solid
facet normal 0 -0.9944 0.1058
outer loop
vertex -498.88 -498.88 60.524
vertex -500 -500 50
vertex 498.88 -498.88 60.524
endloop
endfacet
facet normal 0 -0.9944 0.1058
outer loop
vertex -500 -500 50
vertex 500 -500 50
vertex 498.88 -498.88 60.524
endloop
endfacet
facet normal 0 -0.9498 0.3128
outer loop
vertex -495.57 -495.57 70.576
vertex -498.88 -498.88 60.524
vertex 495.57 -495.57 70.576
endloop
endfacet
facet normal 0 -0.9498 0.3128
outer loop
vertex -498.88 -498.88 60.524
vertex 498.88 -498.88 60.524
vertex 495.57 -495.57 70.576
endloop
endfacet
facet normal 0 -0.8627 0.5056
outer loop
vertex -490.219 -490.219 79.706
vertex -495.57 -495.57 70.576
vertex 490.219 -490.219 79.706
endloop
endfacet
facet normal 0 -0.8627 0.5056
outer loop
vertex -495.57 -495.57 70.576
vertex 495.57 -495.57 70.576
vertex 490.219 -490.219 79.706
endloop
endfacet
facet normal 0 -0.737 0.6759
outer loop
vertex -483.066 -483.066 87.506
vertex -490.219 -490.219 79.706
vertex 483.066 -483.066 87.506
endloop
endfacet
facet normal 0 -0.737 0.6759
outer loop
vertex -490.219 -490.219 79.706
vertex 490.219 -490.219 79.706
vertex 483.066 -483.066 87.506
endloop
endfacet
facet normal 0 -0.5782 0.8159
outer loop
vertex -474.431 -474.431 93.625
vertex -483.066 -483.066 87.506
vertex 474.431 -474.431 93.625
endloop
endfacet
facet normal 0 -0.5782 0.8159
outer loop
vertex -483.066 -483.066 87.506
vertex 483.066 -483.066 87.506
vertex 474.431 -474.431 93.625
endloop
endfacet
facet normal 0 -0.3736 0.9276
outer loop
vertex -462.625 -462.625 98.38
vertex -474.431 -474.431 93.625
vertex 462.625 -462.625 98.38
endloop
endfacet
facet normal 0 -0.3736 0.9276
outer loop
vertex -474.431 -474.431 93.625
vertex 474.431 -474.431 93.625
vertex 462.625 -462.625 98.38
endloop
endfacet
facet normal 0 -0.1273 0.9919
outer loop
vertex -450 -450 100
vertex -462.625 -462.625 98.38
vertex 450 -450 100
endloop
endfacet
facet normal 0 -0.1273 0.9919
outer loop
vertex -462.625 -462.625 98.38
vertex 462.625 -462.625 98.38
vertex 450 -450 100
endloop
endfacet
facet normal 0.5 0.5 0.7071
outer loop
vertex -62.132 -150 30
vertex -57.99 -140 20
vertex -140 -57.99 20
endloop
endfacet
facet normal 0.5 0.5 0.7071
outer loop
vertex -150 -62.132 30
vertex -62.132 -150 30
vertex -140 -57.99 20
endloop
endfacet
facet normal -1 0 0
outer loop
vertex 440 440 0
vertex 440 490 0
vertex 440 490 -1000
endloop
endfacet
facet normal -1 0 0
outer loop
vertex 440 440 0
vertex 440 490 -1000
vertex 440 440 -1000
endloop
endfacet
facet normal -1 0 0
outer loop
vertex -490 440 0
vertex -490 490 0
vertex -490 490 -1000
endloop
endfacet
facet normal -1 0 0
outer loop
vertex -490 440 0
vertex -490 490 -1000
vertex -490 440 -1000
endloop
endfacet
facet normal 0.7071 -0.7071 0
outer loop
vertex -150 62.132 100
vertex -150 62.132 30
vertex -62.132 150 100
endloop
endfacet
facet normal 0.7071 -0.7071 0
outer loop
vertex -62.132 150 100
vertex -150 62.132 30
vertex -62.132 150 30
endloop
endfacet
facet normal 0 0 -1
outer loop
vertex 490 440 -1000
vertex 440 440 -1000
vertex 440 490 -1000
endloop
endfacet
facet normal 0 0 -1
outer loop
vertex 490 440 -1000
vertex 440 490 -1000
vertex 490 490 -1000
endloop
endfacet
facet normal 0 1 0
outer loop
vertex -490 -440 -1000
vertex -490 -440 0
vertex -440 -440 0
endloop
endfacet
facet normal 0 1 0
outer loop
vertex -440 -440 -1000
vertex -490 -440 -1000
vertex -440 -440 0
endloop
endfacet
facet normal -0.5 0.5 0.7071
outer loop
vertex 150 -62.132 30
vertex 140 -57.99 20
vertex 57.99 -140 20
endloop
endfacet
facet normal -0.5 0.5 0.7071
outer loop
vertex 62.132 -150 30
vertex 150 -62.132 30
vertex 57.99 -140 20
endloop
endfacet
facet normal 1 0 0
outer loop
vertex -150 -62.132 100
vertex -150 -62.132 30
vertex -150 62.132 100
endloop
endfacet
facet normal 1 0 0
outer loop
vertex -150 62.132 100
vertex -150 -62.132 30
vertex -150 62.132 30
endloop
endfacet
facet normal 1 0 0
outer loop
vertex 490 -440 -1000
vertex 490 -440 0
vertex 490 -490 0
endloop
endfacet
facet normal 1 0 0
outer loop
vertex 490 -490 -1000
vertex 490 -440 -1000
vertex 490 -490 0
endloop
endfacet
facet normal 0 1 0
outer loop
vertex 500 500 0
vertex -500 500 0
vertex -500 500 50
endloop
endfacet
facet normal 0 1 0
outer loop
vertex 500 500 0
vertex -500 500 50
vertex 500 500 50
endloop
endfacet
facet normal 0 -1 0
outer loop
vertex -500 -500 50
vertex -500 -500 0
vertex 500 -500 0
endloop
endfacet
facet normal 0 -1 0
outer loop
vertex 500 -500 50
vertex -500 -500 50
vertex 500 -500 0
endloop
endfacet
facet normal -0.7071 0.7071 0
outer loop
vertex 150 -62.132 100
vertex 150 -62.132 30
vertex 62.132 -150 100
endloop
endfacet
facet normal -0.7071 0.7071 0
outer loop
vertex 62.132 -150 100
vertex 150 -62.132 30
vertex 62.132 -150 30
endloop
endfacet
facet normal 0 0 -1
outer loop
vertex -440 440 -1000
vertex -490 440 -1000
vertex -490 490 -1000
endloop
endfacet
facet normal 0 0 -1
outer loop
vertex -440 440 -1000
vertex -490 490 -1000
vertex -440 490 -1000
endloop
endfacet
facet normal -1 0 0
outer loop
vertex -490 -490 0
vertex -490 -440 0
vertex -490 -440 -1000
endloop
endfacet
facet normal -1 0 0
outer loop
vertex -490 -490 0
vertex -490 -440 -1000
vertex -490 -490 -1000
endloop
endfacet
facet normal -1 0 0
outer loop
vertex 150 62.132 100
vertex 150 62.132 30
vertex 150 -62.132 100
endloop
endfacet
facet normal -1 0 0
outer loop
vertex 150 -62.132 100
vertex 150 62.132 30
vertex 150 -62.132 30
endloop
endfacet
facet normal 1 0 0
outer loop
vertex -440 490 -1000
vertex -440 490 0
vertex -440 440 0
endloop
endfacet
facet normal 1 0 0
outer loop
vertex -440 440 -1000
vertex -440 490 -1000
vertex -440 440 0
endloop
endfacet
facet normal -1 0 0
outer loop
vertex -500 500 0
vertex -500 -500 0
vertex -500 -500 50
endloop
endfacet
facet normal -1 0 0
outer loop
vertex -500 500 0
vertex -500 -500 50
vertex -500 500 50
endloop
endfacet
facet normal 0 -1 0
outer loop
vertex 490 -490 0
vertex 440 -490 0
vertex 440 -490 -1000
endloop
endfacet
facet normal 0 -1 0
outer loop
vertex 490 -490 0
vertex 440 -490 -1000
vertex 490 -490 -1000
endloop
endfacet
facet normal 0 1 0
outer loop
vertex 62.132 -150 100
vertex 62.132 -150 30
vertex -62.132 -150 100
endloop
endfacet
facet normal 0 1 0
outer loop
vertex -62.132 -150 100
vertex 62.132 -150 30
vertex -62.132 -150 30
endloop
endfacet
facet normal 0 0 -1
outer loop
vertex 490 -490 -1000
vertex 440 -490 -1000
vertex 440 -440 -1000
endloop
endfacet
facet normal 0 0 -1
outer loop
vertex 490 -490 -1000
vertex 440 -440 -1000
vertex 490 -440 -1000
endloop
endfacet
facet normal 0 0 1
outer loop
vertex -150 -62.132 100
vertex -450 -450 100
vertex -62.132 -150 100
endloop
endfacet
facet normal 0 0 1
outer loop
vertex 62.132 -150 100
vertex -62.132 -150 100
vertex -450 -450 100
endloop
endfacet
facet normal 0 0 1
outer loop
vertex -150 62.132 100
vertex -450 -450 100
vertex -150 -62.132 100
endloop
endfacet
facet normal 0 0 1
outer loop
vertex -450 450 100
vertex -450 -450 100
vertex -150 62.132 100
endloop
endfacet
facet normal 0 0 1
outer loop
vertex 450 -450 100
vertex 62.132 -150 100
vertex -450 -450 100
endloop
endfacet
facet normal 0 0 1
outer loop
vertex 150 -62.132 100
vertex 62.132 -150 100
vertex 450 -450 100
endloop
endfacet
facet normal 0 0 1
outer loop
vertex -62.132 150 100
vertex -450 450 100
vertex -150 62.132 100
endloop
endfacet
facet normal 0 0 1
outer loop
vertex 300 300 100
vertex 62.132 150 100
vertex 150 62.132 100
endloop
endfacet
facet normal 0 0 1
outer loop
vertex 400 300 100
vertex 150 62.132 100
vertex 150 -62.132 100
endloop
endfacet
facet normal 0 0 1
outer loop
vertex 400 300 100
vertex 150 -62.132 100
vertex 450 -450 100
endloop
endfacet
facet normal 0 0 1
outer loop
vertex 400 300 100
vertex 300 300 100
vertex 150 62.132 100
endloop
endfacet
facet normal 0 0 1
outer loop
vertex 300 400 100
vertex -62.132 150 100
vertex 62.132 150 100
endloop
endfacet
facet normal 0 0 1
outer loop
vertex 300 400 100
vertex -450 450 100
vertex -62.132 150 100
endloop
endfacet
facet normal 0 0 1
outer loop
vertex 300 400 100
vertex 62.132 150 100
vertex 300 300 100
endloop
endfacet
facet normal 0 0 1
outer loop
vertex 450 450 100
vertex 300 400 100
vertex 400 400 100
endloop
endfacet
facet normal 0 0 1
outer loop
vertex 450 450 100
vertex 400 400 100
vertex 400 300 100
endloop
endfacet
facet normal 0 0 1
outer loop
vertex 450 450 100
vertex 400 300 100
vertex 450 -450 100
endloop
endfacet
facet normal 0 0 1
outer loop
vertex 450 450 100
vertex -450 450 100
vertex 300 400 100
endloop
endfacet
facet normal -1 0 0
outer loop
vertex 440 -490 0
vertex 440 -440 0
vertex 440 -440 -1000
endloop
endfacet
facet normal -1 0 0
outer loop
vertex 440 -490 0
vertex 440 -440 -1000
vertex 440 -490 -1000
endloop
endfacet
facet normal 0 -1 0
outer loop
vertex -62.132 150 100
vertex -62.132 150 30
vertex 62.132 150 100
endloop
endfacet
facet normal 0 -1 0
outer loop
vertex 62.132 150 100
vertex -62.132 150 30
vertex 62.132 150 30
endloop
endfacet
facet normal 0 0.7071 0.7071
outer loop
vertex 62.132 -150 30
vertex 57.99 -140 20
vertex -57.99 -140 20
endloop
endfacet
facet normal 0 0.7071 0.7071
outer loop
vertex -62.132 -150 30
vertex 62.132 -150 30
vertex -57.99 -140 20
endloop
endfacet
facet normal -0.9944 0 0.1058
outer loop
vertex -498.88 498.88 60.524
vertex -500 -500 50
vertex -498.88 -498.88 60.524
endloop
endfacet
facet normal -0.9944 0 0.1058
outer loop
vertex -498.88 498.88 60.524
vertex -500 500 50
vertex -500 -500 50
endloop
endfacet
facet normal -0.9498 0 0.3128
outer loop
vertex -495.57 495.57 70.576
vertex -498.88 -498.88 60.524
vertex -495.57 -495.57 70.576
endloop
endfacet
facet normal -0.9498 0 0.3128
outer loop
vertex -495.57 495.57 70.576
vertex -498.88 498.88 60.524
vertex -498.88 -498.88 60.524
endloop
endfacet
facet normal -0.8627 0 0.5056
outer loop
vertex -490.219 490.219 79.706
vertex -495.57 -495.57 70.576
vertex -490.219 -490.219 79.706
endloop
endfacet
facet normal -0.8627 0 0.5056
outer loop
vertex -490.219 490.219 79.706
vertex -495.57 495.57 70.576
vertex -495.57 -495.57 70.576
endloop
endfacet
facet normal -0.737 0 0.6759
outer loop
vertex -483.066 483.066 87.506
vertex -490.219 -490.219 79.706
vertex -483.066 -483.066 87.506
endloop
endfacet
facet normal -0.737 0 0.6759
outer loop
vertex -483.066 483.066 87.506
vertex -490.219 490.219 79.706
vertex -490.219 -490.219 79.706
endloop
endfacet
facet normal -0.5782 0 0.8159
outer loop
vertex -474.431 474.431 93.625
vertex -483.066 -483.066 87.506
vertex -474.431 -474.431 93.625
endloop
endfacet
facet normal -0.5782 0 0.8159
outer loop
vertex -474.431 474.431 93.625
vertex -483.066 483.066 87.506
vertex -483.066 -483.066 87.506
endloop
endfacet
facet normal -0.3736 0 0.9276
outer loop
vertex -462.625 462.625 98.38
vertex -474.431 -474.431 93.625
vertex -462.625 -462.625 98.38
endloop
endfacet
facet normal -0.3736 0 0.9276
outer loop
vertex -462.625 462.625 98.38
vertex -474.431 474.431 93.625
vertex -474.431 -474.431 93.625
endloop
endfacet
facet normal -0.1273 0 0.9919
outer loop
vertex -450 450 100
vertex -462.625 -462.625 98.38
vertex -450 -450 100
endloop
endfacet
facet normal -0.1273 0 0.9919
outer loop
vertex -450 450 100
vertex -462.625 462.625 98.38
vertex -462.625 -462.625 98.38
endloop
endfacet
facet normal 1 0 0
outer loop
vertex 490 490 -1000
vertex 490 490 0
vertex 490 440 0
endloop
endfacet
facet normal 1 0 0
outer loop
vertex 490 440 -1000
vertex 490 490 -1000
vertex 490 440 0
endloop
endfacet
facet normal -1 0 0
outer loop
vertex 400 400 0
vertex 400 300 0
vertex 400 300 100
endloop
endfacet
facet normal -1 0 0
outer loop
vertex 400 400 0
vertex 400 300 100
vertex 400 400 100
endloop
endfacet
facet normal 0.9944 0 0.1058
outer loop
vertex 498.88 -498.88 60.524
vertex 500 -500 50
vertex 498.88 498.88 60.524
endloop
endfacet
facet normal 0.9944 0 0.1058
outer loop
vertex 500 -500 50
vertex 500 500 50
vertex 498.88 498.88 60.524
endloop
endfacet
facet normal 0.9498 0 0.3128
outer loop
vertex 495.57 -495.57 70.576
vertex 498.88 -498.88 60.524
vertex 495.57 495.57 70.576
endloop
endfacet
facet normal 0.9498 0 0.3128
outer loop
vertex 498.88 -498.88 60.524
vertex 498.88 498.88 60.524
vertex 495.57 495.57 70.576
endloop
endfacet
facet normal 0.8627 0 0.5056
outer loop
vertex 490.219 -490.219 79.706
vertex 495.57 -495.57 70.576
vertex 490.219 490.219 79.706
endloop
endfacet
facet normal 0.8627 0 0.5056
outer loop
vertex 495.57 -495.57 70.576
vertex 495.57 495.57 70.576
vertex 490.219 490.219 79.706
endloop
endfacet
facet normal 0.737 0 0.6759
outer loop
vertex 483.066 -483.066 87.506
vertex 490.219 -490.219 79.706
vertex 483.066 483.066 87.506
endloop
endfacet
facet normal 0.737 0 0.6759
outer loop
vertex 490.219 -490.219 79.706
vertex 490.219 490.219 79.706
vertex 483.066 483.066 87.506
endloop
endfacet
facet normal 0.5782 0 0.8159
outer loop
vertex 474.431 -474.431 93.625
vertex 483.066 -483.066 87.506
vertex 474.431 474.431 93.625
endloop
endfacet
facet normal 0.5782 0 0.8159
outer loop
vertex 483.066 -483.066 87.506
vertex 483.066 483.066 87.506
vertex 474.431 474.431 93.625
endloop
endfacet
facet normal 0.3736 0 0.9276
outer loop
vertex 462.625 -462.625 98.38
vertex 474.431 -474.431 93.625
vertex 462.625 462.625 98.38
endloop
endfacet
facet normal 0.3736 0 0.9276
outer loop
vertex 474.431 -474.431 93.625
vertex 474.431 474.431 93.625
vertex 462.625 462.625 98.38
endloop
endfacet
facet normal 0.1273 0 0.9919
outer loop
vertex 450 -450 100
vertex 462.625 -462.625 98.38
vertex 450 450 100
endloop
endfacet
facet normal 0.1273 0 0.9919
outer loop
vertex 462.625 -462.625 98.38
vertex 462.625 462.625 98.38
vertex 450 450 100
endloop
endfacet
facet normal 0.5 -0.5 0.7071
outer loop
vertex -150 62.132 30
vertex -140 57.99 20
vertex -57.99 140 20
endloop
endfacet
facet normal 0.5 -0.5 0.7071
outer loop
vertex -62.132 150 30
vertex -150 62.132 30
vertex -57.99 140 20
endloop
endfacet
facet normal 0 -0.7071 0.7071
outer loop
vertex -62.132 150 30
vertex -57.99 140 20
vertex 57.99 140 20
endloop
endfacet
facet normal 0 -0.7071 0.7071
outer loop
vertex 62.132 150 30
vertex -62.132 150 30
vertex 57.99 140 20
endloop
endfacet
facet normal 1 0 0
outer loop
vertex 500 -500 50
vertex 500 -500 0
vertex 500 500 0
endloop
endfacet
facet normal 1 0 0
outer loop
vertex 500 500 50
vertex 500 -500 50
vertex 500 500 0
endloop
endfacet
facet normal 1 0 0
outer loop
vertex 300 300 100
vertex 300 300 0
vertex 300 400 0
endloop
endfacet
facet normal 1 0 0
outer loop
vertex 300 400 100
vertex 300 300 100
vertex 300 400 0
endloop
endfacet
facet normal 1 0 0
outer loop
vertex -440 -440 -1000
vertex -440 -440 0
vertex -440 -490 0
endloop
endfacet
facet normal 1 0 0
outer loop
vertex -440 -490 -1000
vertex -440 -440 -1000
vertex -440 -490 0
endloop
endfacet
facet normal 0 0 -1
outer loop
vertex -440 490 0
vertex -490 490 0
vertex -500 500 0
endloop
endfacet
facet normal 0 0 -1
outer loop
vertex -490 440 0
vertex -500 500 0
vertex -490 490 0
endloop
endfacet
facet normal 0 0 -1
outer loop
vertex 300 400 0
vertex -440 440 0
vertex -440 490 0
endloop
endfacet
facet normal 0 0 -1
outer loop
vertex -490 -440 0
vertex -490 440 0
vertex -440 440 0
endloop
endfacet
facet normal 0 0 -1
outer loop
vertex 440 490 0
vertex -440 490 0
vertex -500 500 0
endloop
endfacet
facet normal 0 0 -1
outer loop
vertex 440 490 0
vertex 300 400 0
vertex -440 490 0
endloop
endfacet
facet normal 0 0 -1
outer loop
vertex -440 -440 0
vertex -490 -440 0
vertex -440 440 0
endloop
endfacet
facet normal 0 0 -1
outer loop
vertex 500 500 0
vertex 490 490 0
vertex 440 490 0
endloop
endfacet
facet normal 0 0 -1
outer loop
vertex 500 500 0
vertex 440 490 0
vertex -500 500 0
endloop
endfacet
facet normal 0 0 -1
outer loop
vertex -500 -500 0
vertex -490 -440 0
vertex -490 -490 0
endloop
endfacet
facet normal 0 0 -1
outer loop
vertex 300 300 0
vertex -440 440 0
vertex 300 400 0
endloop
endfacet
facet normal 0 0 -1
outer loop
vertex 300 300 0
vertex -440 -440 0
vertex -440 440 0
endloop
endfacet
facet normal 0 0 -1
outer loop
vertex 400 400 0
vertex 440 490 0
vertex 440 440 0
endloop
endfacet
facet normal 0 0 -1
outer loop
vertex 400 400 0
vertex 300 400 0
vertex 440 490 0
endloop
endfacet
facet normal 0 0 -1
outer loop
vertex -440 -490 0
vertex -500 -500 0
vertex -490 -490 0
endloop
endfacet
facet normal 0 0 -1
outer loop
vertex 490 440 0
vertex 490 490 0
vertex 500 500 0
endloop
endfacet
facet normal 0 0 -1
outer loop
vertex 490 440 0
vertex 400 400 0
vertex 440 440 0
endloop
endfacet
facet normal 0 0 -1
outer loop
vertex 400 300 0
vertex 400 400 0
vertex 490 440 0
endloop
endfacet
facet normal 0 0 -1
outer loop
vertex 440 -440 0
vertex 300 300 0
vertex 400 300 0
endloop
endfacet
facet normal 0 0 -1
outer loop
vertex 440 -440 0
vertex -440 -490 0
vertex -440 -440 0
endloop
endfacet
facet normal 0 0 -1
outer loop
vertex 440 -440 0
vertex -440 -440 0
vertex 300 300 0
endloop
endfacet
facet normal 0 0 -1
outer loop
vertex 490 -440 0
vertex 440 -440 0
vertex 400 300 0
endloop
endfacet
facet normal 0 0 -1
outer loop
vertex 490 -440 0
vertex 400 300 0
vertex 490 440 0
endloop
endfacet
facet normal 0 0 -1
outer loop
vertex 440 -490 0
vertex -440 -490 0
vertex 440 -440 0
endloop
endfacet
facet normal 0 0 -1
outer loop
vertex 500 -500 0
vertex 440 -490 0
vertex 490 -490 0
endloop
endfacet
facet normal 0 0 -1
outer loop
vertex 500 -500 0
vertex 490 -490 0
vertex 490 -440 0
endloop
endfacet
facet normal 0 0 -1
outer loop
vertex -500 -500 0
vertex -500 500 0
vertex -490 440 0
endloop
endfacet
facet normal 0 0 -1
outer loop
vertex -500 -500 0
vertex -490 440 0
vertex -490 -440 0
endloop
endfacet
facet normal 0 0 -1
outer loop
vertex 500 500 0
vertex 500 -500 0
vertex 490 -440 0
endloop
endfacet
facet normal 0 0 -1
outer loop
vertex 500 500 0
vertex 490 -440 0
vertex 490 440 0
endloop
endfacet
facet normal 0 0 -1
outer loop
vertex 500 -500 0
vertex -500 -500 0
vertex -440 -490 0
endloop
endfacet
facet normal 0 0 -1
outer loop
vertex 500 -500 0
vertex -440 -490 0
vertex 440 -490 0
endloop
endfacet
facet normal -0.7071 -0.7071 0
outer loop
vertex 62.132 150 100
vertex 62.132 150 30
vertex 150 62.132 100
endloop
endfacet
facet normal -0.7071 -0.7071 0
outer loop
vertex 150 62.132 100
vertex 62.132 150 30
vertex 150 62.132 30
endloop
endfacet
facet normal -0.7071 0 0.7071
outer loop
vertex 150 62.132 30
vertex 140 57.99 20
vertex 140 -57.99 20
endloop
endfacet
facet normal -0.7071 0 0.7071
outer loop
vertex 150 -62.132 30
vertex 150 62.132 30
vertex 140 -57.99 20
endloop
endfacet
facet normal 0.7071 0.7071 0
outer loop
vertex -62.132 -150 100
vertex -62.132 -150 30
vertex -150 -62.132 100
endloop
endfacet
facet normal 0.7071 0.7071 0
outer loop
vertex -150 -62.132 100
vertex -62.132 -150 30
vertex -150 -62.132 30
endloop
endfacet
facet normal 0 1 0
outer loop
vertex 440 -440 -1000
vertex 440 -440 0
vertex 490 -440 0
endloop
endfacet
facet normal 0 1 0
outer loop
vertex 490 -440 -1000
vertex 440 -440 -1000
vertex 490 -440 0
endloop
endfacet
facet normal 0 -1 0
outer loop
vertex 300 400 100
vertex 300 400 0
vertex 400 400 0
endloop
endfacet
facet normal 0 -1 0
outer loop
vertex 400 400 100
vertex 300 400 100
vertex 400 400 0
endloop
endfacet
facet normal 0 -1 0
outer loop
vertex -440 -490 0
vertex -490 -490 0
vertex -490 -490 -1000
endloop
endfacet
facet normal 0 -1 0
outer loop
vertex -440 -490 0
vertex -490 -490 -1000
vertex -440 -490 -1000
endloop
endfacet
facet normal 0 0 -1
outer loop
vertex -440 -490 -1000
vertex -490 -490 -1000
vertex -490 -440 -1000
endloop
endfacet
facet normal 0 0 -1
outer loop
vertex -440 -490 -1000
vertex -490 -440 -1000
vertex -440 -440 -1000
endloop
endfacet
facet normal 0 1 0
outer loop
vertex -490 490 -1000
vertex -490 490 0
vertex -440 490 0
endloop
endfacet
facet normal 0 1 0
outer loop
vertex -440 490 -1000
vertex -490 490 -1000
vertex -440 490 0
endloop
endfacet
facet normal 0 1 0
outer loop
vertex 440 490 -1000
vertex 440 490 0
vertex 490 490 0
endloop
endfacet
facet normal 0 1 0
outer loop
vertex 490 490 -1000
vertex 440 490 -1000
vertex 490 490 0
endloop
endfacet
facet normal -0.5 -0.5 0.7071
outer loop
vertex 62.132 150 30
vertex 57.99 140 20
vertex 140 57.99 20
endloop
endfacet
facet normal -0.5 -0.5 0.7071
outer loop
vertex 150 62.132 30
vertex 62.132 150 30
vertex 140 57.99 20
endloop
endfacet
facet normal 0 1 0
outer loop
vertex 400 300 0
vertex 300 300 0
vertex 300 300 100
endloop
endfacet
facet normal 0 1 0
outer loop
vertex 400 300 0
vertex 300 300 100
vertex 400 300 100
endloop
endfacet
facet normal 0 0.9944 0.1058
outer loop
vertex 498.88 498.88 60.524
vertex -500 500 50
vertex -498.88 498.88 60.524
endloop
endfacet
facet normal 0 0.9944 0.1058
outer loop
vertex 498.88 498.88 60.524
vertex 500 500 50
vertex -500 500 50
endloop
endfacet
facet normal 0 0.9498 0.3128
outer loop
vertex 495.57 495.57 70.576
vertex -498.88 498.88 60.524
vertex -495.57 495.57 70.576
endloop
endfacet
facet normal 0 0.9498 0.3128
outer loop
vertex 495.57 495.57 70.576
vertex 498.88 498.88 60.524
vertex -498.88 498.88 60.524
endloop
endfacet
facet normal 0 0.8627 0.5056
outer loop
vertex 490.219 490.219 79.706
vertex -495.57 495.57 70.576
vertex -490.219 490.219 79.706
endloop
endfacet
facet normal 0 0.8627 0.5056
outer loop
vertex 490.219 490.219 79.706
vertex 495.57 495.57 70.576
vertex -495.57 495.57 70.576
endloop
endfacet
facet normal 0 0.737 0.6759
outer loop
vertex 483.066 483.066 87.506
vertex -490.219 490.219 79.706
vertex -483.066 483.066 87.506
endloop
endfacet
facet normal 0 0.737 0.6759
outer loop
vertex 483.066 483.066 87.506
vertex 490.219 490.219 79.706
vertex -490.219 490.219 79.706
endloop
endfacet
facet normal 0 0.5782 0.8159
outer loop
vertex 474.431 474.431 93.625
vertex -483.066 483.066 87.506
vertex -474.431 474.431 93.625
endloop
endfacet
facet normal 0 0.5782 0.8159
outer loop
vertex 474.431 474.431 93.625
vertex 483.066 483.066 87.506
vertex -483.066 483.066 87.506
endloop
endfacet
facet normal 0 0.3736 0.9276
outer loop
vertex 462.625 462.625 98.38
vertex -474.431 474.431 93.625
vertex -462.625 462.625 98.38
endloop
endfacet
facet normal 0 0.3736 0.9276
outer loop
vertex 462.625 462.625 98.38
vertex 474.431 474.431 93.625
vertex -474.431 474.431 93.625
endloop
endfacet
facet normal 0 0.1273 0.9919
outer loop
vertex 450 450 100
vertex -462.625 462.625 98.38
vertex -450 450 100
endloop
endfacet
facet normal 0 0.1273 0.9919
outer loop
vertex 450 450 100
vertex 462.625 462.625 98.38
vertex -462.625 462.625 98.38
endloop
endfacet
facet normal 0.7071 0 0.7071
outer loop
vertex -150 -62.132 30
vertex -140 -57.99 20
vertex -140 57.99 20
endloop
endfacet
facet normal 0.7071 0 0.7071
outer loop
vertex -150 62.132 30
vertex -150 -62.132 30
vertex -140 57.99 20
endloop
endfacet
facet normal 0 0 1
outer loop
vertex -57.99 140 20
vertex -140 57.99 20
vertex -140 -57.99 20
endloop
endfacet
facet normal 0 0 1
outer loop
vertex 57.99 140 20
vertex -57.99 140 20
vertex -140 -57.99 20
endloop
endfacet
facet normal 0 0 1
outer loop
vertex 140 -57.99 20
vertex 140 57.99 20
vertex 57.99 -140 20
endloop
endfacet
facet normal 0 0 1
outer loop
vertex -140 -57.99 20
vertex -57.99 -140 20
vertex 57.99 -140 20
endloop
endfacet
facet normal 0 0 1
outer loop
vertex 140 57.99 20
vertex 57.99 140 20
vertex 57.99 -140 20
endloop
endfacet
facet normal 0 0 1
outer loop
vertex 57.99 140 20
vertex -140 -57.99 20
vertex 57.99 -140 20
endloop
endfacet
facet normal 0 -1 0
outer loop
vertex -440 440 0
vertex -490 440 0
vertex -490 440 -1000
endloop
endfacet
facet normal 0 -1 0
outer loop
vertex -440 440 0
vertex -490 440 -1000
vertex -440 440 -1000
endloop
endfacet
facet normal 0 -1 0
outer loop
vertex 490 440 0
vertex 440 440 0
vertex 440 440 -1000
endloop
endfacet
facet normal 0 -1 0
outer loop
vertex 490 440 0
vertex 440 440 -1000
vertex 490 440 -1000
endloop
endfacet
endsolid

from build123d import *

# Parameters (mm, degrees)
F0_W     = 1000
F0_H     = 1000
F0_W_2   = 100
F0_H_2   = 100
F1_DEPTH = 100
F2_R     = 50
F4_DEPTH = 20
F5_W     = 50
F5_H     = 50
F6_DEPTH = 1000
F7_SIZE  = 10


with BuildPart() as f1:
    # F0 (on Top) → F1 (new body)
    with BuildSketch(Plane.XY):
        Rectangle(F0_W, F0_H)
        Polygon((62.132034, 150), (150, 62.132034), (150, -62.132034), (62.132034, -150), (-62.132034, -150), (-150, -62.132034), (-150, 62.132034), (-62.132034, 150), align=None, mode=Mode.SUBTRACT)
        with Locations((350, 350)):
            Rectangle(F0_W_2, F0_H_2, mode=Mode.SUBTRACT)
    extrude(amount=F1_DEPTH)

    # F2
    f2_edges = [f1.edges().sort_by_distance(p)[0] for p in [
        (0, -500, 100),
        (-500, 0, 100),
        (0, 500, 100),
        (500, 0, 100),
    ]]
    fillet(f2_edges, radius=F2_R)

    # F3 (on face) → F4 (join)
    with BuildSketch(Plane(origin=(0, 0, 0), x_dir=(1, 0, 0), z_dir=(0, 0, -1))):
        Polygon((150, -62.132034), (150, 62.132034), (62.132034, 150), (-62.132034, 150), (-150, 62.132034), (-150, -62.132034), (-62.132034, -150), (62.132034, -150), align=None)
    extrude(amount=-F4_DEPTH)

    # F5 (on face) → F6 (join)
    with BuildSketch(Plane(origin=(0, 0, 0), x_dir=(1, 0, 0), z_dir=(0, 0, -1))):
        with Locations((-465, 465)):
            Rectangle(F5_W, F5_H)
        with Locations((-465, -465)):
            Rectangle(F5_W, F5_H)
        with Locations((465, -465)):
            Rectangle(F5_W, F5_H)
        with Locations((465, 465)):
            Rectangle(F5_W, F5_H)
    extrude(amount=F6_DEPTH)

    # F7
    f7_edges = [f1.edges().sort_by_distance(p)[0] for p in [
        (150, 0, 20),
        (106.066017, -106.066017, 20),
        (0, -150, 20),
        (-106.066017, -106.066017, 20),
        (-150, 0, 20),
        (-106.066017, 106.066017, 20),
        (0, 150, 20),
        (106.066017, 106.066017, 20),
    ]]
    chamfer(f7_edges, length=F7_SIZE)


solid = f1.part
